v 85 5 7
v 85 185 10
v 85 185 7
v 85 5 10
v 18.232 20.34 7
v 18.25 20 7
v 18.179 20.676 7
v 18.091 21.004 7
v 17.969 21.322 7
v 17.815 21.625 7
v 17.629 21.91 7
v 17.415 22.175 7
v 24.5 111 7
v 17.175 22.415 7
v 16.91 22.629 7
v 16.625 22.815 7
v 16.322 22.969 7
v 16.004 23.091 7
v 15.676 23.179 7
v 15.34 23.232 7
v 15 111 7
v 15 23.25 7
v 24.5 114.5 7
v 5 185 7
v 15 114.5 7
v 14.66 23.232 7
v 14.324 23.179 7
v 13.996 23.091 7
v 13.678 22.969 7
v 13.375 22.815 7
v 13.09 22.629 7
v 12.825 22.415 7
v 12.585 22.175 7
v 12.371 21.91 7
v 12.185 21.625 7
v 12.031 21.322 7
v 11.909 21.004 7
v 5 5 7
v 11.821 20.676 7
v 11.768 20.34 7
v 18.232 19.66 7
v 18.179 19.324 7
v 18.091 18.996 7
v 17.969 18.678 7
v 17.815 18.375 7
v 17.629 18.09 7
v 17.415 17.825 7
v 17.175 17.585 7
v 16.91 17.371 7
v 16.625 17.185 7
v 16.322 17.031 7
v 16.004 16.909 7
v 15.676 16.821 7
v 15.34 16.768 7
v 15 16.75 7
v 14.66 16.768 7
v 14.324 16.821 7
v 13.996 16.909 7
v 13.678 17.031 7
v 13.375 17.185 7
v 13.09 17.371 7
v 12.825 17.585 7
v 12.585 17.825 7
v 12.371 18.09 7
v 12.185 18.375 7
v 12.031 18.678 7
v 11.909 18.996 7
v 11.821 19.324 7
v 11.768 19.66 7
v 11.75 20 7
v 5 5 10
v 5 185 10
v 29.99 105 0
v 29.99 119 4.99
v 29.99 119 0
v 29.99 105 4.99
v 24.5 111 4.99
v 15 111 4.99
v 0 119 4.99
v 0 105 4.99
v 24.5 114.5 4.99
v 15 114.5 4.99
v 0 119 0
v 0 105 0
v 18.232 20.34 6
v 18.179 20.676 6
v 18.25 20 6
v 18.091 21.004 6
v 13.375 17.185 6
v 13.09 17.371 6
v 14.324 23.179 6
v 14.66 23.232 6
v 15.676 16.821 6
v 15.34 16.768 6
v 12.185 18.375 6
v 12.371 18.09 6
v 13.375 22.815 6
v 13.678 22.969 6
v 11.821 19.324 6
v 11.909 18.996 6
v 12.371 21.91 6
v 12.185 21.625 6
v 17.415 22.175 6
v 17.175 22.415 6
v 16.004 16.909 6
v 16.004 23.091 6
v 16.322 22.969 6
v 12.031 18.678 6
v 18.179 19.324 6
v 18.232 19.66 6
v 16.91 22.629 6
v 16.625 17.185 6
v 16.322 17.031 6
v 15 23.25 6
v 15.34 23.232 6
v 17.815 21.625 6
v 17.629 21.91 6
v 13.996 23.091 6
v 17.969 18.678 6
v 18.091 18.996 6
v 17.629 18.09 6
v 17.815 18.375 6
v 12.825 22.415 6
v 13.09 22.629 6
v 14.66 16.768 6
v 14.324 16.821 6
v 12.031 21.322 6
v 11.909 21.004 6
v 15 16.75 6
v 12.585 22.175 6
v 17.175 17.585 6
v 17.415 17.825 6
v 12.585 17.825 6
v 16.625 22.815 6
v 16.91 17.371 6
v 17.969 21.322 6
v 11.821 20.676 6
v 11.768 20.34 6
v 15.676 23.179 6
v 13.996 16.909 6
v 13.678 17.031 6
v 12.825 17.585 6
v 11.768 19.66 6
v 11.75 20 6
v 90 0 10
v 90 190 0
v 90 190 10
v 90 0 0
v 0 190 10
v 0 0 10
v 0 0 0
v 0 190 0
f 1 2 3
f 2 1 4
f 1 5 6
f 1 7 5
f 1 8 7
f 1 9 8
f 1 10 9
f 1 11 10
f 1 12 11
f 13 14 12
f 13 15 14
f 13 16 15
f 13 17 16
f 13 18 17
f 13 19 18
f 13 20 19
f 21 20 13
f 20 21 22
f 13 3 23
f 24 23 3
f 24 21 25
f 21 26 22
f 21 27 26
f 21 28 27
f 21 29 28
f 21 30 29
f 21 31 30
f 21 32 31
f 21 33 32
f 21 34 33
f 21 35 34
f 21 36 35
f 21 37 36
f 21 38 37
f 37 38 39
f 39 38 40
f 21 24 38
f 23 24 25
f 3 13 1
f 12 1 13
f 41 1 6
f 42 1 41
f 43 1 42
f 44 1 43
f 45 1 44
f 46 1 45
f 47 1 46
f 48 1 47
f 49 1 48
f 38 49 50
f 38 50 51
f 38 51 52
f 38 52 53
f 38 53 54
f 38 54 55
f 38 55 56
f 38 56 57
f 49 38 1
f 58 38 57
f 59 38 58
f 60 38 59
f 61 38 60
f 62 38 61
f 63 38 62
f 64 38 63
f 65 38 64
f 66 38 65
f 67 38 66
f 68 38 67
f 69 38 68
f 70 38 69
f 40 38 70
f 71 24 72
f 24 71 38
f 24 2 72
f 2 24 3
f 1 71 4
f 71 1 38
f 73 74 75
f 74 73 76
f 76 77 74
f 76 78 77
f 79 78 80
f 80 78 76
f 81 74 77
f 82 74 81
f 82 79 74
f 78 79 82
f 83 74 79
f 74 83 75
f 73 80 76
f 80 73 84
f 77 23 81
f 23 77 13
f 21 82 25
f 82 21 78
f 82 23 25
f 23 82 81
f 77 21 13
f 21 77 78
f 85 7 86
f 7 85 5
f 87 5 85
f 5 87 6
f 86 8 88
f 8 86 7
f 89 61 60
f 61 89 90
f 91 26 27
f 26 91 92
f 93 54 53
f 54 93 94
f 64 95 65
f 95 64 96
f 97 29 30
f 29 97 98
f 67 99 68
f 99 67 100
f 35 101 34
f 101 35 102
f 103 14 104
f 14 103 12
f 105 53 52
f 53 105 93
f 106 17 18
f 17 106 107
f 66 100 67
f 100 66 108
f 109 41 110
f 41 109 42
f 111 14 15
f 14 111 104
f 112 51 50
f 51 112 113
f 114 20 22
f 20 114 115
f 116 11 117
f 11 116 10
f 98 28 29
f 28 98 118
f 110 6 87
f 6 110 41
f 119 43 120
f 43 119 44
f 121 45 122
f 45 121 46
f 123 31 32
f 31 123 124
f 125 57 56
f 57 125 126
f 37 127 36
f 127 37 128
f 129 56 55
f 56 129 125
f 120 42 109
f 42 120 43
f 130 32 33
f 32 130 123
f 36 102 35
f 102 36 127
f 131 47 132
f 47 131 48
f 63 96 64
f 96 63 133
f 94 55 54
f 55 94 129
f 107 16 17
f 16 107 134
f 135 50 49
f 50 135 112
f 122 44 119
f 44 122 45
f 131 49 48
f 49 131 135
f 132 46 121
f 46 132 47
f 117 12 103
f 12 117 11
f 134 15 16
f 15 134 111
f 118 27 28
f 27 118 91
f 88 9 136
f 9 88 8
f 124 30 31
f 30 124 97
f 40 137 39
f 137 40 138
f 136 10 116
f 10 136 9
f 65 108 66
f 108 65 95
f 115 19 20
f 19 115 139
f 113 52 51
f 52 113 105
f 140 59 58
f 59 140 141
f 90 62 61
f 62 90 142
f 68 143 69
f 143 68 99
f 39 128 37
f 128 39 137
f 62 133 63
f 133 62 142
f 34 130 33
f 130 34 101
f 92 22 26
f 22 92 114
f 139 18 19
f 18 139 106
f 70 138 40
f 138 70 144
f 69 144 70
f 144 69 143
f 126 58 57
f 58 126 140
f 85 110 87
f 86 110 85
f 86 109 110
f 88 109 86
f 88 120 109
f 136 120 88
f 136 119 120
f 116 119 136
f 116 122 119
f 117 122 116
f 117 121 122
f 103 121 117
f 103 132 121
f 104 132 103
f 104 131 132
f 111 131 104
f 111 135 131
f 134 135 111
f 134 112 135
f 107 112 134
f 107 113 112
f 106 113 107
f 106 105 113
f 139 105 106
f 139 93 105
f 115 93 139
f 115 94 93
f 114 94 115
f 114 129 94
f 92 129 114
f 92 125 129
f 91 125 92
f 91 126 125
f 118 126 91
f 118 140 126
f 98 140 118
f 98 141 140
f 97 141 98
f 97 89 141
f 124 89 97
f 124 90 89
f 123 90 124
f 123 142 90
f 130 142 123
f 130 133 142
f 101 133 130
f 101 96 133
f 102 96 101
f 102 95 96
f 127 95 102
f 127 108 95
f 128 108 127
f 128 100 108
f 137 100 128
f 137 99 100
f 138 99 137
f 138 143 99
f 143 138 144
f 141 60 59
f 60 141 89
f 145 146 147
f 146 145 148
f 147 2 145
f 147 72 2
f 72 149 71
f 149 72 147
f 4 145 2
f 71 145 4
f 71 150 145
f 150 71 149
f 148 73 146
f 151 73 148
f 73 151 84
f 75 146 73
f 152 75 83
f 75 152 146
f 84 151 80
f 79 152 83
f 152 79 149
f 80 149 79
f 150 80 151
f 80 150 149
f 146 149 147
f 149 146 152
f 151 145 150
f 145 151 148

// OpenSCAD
$fn = 60;

module mass() {
  cube([90,190,10]);
}

module miss() {
  translate([5,5,7]) cube([80,180,10]);         // Calc recess
  translate([-0.01,105,-0.01]) cube([30,14,5]); // PCB cutout
  translate([15,111,2]) cube([9.5,3.5,10]);     // USB-C cutout
  //Add little recesses for the calc feet to 'plop into'
  translate([15,20,6]) cylinder(d=6.5, h=10);
  //etc
}

difference() {
  mass();
  miss();
}
